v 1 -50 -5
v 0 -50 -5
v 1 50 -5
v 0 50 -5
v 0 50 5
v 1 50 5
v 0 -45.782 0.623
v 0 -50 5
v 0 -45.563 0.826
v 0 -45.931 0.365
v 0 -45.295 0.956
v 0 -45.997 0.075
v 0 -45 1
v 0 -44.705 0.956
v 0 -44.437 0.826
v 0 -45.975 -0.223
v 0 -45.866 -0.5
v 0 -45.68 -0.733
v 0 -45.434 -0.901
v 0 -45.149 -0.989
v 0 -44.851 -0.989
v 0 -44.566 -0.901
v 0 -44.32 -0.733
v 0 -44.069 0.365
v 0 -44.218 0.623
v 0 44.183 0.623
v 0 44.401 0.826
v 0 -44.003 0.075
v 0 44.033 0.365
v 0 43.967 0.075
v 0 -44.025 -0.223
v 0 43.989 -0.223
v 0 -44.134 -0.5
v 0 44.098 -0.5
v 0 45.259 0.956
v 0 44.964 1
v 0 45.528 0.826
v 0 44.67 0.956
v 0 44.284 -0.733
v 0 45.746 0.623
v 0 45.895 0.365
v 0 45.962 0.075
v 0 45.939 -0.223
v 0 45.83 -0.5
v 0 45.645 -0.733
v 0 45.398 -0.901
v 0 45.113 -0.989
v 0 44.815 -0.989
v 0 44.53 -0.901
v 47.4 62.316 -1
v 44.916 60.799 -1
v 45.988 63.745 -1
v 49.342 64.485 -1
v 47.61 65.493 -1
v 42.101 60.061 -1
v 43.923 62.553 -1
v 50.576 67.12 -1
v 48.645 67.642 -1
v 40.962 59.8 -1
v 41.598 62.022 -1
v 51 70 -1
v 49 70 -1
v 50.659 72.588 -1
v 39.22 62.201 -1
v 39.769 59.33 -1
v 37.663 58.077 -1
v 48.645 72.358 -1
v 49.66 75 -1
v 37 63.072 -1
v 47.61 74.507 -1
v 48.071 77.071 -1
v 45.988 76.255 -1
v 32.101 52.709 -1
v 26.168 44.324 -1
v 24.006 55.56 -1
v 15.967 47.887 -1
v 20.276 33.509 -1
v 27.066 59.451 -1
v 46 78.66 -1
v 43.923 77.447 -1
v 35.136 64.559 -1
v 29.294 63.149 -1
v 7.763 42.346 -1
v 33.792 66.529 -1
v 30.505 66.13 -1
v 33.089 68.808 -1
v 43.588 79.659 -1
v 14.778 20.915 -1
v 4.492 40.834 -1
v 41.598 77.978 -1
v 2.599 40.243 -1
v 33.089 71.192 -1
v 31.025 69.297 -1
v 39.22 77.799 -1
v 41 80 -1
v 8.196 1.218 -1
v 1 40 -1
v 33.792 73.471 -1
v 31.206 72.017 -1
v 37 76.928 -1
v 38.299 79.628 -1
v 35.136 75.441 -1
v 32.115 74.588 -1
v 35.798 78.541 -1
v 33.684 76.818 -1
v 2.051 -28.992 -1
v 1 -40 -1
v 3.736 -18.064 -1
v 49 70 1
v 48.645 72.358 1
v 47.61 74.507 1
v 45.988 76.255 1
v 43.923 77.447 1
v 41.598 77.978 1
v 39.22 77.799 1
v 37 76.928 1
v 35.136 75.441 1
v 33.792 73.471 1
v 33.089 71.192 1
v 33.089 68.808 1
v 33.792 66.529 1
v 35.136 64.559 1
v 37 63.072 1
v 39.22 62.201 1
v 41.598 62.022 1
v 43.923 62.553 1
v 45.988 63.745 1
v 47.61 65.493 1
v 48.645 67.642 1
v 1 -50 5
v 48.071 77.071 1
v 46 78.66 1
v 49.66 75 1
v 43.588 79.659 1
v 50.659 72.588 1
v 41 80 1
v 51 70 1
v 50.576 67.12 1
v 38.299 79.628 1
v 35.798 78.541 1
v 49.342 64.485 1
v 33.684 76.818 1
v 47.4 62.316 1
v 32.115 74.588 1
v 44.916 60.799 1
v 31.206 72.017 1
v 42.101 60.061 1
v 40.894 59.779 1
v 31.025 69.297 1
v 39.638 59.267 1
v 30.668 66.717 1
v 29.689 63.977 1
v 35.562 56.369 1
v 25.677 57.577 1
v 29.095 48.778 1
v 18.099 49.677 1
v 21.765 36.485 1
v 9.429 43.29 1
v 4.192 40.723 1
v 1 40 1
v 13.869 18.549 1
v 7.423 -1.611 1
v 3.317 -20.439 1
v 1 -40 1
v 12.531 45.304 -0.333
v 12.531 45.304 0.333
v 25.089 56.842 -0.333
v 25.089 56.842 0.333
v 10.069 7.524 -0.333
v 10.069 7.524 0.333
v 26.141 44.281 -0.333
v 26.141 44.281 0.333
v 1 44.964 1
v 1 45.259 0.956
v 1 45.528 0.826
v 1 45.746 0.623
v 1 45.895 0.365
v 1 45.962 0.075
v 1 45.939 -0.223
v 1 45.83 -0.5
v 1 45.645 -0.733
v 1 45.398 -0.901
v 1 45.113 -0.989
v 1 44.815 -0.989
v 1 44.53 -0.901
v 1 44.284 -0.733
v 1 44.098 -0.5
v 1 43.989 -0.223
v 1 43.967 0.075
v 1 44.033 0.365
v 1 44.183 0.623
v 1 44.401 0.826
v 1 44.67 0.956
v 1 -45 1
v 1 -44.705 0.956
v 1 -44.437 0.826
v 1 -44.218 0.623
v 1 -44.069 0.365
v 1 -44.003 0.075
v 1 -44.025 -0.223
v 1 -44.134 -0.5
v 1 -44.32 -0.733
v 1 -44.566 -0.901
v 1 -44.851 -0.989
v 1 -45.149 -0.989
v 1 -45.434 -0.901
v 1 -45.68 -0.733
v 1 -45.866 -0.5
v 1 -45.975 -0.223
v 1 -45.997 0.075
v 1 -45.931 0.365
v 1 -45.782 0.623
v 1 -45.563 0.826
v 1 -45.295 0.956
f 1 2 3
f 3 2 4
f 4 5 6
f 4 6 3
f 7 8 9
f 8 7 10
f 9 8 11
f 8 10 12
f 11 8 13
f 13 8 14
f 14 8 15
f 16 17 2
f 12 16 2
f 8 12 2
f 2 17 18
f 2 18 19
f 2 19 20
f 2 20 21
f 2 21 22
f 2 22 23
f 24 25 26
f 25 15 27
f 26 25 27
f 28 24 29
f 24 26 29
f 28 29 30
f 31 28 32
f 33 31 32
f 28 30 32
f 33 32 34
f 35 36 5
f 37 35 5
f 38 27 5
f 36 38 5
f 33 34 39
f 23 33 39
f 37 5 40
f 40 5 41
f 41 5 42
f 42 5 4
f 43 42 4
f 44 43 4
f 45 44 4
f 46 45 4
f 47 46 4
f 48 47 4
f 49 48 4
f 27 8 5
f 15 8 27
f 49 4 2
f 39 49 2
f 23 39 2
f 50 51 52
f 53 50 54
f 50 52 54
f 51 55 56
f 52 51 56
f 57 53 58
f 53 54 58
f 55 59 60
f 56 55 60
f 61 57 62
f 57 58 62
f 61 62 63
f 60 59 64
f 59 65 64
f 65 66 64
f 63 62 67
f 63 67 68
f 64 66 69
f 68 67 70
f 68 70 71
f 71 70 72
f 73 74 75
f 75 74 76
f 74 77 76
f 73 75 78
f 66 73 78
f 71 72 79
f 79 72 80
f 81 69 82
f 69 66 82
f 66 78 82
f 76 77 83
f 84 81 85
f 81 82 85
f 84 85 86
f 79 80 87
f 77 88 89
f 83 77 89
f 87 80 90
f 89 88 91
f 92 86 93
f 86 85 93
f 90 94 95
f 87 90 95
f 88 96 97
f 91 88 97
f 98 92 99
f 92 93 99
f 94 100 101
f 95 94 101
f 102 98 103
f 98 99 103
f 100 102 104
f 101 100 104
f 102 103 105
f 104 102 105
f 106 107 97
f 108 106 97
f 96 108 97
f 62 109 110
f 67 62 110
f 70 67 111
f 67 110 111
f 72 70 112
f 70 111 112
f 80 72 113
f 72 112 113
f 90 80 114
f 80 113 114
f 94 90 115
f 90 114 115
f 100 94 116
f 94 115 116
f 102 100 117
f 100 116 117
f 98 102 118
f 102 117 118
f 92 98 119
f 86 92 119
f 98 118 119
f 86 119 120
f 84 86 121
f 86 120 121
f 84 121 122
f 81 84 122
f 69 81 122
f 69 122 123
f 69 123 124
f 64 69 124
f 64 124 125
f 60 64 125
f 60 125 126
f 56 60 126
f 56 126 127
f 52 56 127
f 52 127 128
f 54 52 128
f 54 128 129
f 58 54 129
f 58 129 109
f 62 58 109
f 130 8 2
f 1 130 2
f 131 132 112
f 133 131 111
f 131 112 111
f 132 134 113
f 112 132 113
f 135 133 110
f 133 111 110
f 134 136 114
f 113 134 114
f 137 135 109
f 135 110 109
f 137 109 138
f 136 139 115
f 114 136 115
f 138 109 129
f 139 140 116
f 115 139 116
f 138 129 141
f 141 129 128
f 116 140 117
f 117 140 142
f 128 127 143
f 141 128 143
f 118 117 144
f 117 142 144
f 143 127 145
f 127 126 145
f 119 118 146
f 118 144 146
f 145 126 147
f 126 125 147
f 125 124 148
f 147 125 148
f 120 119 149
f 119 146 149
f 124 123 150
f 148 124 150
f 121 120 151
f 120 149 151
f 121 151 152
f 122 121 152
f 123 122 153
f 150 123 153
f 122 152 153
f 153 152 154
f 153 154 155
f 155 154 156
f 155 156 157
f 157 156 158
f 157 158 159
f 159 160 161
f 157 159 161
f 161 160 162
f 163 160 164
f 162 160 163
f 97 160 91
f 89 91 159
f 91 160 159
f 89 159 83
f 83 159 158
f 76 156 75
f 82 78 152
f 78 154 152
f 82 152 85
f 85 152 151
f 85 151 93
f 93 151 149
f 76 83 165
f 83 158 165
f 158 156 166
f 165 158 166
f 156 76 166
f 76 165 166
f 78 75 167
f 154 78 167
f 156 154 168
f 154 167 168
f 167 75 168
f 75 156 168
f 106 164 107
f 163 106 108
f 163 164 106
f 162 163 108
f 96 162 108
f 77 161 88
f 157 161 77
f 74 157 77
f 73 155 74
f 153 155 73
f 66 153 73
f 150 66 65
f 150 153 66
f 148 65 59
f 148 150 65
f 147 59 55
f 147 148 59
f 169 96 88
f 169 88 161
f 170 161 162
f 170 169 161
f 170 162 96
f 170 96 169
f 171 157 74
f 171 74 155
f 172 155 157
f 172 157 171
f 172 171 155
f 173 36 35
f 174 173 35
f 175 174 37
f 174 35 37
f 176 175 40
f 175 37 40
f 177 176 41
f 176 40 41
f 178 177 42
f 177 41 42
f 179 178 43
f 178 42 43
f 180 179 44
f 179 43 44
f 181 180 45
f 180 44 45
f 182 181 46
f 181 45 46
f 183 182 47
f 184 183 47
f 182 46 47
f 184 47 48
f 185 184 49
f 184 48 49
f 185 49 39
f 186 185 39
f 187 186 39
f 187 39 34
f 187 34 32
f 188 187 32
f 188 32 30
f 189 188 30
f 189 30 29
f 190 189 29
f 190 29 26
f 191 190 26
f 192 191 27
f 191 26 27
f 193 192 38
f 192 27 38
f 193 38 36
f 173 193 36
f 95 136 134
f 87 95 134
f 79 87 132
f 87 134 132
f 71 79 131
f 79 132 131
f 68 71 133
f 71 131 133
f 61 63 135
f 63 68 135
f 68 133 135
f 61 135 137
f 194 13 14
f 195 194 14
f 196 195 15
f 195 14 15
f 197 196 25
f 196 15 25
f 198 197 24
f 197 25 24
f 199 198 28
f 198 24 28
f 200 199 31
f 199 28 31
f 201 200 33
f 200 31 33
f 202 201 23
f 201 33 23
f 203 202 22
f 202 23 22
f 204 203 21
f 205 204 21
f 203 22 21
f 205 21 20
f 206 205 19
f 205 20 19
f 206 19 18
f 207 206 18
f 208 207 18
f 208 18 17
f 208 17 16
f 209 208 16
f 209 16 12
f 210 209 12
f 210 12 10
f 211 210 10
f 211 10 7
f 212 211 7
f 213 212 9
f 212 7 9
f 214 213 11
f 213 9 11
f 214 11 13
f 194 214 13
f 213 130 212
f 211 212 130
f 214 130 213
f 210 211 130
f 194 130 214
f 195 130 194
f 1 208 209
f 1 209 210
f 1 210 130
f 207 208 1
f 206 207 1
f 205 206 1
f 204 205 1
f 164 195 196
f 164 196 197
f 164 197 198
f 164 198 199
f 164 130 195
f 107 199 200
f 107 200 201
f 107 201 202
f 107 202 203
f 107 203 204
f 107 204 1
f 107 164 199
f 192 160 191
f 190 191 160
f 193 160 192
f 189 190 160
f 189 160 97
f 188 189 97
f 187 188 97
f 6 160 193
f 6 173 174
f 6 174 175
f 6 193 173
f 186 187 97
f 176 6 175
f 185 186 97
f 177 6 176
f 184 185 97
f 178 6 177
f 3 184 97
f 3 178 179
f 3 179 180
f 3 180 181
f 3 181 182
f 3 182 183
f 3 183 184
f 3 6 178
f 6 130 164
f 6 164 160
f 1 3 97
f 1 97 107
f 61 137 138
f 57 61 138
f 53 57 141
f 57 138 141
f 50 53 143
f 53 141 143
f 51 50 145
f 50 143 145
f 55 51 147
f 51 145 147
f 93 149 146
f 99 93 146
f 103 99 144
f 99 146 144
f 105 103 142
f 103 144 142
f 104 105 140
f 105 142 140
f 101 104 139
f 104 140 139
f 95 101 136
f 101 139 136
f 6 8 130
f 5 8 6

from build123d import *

# Parameters (mm, degrees)
SKETCH_1_W           = 10
SKETCH_1_H           = 100
EXTRUDE_1_DEPTH      = 1
SKETCH_2_W           = 2
SKETCH_2_H           = 30
SKETCH_2_H_2         = 10
SKETCH_2_H_3         = 80
EXTRUDE_3_DEPTH      = 50
SKETCH_3_R           = 8
CUT_EXTRUDE_11_DEPTH = 50
SKETCH_4_R           = 1
CUT_EXTRUDE_12_DEPTH = 1
SKETCH_5_R           = 1
CUT_EXTRUDE_13_DEPTH = 1


with BuildPart() as part:
    # 草图1 → 凸台-拉伸1 (new body)
    with BuildSketch(Plane(origin=(0, 0, 0), x_dir=(0, 0, -1), z_dir=(1, 0, 0))):
        Rectangle(SKETCH_1_W, SKETCH_1_H)
    extrude(amount=EXTRUDE_1_DEPTH)

    # 草图2 → 凸台-拉伸3 (add)
    with BuildSketch(Plane(origin=(1, 0, 0), x_dir=(0, 0, -1), z_dir=(1, 0, 0))):
        with Locations((0, 65)):
            Rectangle(SKETCH_2_W, SKETCH_2_H)
        with Locations((0, 45)):
            Rectangle(SKETCH_2_W, SKETCH_2_H_2)
        Rectangle(SKETCH_2_W, SKETCH_2_H_3)
    extrude(amount=EXTRUDE_3_DEPTH)

    # 草图3 → 切除-拉伸11 (cut)
    with BuildSketch(Plane.XY.offset(1)):
        with BuildLine():
            Line((1, 80), (1, 40))
            add(Edge.make_bspline(
                [(1, 40), (9.468575597, 40.414680021), (30.950220462, 58.157084532), (31.024773588, 69.296538532)],
                knots=[0, 0, 0, 0, 0.979118635, 0.979118635, 0.979118635, 0.979118635], degree=3))
            ThreePointArc((31.024773588, 69.296538532), (33.684447571, 76.817821695), (41, 80))
            Line((41, 80), (1, 80))
        make_face()
        with Locations((41, 70)):
            Circle(SKETCH_3_R)
        with BuildLine():
            add(Edge.make_bspline(
                [(1, -40), (4.194748365, 9.503139803), (28.570241109, 58.174536765), (42.100694242, 60.060760986)],
                knots=[0, 0, 0, 0, 1, 1, 1, 1], degree=3))
            Line((1, -40), (51, -40))
            Line((51, -40), (51, 70))
            ThreePointArc((51, 70), (48.450065182, 63.329428151), (42.100694242, 60.060760986))
        make_face()
        with BuildLine():
            Line((51, 80), (41, 80))
            ThreePointArc((41, 80), (48.071067812, 77.071067812), (51, 70))
            Line((51, 70), (51, 80))
        make_face()
    extrude(amount=-CUT_EXTRUDE_11_DEPTH, mode=Mode.SUBTRACT)

    # 草图4 → 切除-拉伸12 (cut)
    with BuildSketch(Plane.ZY):
        with Locations((0, 44.964354978)):
            Circle(SKETCH_4_R)
    extrude(amount=-CUT_EXTRUDE_12_DEPTH, mode=Mode.SUBTRACT)

    # 草图5 → 切除-拉伸13 (cut)
    with BuildSketch(Plane.ZY):
        with Locations((0, -45)):
            Circle(SKETCH_5_R)
    extrude(amount=-CUT_EXTRUDE_13_DEPTH, mode=Mode.SUBTRACT)


solid = part.part
